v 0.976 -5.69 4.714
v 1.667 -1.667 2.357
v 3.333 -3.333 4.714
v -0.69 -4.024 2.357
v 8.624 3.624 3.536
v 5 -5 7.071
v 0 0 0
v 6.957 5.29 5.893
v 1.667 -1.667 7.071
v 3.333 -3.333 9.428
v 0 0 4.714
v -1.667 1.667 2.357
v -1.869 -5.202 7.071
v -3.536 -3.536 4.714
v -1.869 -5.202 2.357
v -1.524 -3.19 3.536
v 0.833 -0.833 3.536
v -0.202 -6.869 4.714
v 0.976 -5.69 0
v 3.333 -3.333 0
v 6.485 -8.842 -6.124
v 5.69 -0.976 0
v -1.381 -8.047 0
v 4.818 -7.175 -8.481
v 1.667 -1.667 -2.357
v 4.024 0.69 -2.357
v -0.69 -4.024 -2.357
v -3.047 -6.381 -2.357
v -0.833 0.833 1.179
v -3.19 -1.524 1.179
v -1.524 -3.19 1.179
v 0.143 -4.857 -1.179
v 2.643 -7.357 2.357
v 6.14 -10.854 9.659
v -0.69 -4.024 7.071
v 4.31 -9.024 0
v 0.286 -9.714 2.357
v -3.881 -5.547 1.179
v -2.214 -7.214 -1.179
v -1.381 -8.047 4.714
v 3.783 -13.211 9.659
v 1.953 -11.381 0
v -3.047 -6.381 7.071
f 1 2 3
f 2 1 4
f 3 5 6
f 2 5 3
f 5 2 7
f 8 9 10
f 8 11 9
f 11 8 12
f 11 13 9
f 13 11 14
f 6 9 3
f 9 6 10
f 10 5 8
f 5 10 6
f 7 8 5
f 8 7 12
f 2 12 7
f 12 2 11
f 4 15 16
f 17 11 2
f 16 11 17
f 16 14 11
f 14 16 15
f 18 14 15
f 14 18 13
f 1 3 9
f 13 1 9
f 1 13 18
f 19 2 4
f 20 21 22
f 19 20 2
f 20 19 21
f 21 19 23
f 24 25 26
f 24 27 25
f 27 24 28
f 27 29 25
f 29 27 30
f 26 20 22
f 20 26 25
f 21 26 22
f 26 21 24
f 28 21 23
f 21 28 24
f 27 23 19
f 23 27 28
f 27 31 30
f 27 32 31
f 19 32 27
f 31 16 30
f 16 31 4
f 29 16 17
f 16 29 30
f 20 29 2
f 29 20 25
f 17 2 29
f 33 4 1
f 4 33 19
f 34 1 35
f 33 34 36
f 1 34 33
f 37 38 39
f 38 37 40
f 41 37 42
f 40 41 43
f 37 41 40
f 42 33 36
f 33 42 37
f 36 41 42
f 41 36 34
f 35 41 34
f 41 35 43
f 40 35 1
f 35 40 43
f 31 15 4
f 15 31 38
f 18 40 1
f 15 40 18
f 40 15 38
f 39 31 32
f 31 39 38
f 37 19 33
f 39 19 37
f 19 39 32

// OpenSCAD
/*
Wirt OÜ
© 2024 Hannes Tamme
*/

module arrow(l){
    h = l * sqrt(3) / 2;
    linear_extrude(l/3)
        polygon(points=
            [[0,0],
            [l/3, 0],
            [l/3, - l/2],
            [l/(3/2), - l/2],
            [l/(3/2), 0],
            [l, 0],
            [l/2, h]]);
};

module logo(l){
    rotate([0,-45,-45]){
        arrow(l);
            translate([l/3,-l/(3/2),-l/3])
            rotate([-90,0,90])
                arrow(l);
            translate([l/(3/2),-l/3,l/3])
            rotate([0,90,-90])
                arrow(l);
        }
}

logo(10);
